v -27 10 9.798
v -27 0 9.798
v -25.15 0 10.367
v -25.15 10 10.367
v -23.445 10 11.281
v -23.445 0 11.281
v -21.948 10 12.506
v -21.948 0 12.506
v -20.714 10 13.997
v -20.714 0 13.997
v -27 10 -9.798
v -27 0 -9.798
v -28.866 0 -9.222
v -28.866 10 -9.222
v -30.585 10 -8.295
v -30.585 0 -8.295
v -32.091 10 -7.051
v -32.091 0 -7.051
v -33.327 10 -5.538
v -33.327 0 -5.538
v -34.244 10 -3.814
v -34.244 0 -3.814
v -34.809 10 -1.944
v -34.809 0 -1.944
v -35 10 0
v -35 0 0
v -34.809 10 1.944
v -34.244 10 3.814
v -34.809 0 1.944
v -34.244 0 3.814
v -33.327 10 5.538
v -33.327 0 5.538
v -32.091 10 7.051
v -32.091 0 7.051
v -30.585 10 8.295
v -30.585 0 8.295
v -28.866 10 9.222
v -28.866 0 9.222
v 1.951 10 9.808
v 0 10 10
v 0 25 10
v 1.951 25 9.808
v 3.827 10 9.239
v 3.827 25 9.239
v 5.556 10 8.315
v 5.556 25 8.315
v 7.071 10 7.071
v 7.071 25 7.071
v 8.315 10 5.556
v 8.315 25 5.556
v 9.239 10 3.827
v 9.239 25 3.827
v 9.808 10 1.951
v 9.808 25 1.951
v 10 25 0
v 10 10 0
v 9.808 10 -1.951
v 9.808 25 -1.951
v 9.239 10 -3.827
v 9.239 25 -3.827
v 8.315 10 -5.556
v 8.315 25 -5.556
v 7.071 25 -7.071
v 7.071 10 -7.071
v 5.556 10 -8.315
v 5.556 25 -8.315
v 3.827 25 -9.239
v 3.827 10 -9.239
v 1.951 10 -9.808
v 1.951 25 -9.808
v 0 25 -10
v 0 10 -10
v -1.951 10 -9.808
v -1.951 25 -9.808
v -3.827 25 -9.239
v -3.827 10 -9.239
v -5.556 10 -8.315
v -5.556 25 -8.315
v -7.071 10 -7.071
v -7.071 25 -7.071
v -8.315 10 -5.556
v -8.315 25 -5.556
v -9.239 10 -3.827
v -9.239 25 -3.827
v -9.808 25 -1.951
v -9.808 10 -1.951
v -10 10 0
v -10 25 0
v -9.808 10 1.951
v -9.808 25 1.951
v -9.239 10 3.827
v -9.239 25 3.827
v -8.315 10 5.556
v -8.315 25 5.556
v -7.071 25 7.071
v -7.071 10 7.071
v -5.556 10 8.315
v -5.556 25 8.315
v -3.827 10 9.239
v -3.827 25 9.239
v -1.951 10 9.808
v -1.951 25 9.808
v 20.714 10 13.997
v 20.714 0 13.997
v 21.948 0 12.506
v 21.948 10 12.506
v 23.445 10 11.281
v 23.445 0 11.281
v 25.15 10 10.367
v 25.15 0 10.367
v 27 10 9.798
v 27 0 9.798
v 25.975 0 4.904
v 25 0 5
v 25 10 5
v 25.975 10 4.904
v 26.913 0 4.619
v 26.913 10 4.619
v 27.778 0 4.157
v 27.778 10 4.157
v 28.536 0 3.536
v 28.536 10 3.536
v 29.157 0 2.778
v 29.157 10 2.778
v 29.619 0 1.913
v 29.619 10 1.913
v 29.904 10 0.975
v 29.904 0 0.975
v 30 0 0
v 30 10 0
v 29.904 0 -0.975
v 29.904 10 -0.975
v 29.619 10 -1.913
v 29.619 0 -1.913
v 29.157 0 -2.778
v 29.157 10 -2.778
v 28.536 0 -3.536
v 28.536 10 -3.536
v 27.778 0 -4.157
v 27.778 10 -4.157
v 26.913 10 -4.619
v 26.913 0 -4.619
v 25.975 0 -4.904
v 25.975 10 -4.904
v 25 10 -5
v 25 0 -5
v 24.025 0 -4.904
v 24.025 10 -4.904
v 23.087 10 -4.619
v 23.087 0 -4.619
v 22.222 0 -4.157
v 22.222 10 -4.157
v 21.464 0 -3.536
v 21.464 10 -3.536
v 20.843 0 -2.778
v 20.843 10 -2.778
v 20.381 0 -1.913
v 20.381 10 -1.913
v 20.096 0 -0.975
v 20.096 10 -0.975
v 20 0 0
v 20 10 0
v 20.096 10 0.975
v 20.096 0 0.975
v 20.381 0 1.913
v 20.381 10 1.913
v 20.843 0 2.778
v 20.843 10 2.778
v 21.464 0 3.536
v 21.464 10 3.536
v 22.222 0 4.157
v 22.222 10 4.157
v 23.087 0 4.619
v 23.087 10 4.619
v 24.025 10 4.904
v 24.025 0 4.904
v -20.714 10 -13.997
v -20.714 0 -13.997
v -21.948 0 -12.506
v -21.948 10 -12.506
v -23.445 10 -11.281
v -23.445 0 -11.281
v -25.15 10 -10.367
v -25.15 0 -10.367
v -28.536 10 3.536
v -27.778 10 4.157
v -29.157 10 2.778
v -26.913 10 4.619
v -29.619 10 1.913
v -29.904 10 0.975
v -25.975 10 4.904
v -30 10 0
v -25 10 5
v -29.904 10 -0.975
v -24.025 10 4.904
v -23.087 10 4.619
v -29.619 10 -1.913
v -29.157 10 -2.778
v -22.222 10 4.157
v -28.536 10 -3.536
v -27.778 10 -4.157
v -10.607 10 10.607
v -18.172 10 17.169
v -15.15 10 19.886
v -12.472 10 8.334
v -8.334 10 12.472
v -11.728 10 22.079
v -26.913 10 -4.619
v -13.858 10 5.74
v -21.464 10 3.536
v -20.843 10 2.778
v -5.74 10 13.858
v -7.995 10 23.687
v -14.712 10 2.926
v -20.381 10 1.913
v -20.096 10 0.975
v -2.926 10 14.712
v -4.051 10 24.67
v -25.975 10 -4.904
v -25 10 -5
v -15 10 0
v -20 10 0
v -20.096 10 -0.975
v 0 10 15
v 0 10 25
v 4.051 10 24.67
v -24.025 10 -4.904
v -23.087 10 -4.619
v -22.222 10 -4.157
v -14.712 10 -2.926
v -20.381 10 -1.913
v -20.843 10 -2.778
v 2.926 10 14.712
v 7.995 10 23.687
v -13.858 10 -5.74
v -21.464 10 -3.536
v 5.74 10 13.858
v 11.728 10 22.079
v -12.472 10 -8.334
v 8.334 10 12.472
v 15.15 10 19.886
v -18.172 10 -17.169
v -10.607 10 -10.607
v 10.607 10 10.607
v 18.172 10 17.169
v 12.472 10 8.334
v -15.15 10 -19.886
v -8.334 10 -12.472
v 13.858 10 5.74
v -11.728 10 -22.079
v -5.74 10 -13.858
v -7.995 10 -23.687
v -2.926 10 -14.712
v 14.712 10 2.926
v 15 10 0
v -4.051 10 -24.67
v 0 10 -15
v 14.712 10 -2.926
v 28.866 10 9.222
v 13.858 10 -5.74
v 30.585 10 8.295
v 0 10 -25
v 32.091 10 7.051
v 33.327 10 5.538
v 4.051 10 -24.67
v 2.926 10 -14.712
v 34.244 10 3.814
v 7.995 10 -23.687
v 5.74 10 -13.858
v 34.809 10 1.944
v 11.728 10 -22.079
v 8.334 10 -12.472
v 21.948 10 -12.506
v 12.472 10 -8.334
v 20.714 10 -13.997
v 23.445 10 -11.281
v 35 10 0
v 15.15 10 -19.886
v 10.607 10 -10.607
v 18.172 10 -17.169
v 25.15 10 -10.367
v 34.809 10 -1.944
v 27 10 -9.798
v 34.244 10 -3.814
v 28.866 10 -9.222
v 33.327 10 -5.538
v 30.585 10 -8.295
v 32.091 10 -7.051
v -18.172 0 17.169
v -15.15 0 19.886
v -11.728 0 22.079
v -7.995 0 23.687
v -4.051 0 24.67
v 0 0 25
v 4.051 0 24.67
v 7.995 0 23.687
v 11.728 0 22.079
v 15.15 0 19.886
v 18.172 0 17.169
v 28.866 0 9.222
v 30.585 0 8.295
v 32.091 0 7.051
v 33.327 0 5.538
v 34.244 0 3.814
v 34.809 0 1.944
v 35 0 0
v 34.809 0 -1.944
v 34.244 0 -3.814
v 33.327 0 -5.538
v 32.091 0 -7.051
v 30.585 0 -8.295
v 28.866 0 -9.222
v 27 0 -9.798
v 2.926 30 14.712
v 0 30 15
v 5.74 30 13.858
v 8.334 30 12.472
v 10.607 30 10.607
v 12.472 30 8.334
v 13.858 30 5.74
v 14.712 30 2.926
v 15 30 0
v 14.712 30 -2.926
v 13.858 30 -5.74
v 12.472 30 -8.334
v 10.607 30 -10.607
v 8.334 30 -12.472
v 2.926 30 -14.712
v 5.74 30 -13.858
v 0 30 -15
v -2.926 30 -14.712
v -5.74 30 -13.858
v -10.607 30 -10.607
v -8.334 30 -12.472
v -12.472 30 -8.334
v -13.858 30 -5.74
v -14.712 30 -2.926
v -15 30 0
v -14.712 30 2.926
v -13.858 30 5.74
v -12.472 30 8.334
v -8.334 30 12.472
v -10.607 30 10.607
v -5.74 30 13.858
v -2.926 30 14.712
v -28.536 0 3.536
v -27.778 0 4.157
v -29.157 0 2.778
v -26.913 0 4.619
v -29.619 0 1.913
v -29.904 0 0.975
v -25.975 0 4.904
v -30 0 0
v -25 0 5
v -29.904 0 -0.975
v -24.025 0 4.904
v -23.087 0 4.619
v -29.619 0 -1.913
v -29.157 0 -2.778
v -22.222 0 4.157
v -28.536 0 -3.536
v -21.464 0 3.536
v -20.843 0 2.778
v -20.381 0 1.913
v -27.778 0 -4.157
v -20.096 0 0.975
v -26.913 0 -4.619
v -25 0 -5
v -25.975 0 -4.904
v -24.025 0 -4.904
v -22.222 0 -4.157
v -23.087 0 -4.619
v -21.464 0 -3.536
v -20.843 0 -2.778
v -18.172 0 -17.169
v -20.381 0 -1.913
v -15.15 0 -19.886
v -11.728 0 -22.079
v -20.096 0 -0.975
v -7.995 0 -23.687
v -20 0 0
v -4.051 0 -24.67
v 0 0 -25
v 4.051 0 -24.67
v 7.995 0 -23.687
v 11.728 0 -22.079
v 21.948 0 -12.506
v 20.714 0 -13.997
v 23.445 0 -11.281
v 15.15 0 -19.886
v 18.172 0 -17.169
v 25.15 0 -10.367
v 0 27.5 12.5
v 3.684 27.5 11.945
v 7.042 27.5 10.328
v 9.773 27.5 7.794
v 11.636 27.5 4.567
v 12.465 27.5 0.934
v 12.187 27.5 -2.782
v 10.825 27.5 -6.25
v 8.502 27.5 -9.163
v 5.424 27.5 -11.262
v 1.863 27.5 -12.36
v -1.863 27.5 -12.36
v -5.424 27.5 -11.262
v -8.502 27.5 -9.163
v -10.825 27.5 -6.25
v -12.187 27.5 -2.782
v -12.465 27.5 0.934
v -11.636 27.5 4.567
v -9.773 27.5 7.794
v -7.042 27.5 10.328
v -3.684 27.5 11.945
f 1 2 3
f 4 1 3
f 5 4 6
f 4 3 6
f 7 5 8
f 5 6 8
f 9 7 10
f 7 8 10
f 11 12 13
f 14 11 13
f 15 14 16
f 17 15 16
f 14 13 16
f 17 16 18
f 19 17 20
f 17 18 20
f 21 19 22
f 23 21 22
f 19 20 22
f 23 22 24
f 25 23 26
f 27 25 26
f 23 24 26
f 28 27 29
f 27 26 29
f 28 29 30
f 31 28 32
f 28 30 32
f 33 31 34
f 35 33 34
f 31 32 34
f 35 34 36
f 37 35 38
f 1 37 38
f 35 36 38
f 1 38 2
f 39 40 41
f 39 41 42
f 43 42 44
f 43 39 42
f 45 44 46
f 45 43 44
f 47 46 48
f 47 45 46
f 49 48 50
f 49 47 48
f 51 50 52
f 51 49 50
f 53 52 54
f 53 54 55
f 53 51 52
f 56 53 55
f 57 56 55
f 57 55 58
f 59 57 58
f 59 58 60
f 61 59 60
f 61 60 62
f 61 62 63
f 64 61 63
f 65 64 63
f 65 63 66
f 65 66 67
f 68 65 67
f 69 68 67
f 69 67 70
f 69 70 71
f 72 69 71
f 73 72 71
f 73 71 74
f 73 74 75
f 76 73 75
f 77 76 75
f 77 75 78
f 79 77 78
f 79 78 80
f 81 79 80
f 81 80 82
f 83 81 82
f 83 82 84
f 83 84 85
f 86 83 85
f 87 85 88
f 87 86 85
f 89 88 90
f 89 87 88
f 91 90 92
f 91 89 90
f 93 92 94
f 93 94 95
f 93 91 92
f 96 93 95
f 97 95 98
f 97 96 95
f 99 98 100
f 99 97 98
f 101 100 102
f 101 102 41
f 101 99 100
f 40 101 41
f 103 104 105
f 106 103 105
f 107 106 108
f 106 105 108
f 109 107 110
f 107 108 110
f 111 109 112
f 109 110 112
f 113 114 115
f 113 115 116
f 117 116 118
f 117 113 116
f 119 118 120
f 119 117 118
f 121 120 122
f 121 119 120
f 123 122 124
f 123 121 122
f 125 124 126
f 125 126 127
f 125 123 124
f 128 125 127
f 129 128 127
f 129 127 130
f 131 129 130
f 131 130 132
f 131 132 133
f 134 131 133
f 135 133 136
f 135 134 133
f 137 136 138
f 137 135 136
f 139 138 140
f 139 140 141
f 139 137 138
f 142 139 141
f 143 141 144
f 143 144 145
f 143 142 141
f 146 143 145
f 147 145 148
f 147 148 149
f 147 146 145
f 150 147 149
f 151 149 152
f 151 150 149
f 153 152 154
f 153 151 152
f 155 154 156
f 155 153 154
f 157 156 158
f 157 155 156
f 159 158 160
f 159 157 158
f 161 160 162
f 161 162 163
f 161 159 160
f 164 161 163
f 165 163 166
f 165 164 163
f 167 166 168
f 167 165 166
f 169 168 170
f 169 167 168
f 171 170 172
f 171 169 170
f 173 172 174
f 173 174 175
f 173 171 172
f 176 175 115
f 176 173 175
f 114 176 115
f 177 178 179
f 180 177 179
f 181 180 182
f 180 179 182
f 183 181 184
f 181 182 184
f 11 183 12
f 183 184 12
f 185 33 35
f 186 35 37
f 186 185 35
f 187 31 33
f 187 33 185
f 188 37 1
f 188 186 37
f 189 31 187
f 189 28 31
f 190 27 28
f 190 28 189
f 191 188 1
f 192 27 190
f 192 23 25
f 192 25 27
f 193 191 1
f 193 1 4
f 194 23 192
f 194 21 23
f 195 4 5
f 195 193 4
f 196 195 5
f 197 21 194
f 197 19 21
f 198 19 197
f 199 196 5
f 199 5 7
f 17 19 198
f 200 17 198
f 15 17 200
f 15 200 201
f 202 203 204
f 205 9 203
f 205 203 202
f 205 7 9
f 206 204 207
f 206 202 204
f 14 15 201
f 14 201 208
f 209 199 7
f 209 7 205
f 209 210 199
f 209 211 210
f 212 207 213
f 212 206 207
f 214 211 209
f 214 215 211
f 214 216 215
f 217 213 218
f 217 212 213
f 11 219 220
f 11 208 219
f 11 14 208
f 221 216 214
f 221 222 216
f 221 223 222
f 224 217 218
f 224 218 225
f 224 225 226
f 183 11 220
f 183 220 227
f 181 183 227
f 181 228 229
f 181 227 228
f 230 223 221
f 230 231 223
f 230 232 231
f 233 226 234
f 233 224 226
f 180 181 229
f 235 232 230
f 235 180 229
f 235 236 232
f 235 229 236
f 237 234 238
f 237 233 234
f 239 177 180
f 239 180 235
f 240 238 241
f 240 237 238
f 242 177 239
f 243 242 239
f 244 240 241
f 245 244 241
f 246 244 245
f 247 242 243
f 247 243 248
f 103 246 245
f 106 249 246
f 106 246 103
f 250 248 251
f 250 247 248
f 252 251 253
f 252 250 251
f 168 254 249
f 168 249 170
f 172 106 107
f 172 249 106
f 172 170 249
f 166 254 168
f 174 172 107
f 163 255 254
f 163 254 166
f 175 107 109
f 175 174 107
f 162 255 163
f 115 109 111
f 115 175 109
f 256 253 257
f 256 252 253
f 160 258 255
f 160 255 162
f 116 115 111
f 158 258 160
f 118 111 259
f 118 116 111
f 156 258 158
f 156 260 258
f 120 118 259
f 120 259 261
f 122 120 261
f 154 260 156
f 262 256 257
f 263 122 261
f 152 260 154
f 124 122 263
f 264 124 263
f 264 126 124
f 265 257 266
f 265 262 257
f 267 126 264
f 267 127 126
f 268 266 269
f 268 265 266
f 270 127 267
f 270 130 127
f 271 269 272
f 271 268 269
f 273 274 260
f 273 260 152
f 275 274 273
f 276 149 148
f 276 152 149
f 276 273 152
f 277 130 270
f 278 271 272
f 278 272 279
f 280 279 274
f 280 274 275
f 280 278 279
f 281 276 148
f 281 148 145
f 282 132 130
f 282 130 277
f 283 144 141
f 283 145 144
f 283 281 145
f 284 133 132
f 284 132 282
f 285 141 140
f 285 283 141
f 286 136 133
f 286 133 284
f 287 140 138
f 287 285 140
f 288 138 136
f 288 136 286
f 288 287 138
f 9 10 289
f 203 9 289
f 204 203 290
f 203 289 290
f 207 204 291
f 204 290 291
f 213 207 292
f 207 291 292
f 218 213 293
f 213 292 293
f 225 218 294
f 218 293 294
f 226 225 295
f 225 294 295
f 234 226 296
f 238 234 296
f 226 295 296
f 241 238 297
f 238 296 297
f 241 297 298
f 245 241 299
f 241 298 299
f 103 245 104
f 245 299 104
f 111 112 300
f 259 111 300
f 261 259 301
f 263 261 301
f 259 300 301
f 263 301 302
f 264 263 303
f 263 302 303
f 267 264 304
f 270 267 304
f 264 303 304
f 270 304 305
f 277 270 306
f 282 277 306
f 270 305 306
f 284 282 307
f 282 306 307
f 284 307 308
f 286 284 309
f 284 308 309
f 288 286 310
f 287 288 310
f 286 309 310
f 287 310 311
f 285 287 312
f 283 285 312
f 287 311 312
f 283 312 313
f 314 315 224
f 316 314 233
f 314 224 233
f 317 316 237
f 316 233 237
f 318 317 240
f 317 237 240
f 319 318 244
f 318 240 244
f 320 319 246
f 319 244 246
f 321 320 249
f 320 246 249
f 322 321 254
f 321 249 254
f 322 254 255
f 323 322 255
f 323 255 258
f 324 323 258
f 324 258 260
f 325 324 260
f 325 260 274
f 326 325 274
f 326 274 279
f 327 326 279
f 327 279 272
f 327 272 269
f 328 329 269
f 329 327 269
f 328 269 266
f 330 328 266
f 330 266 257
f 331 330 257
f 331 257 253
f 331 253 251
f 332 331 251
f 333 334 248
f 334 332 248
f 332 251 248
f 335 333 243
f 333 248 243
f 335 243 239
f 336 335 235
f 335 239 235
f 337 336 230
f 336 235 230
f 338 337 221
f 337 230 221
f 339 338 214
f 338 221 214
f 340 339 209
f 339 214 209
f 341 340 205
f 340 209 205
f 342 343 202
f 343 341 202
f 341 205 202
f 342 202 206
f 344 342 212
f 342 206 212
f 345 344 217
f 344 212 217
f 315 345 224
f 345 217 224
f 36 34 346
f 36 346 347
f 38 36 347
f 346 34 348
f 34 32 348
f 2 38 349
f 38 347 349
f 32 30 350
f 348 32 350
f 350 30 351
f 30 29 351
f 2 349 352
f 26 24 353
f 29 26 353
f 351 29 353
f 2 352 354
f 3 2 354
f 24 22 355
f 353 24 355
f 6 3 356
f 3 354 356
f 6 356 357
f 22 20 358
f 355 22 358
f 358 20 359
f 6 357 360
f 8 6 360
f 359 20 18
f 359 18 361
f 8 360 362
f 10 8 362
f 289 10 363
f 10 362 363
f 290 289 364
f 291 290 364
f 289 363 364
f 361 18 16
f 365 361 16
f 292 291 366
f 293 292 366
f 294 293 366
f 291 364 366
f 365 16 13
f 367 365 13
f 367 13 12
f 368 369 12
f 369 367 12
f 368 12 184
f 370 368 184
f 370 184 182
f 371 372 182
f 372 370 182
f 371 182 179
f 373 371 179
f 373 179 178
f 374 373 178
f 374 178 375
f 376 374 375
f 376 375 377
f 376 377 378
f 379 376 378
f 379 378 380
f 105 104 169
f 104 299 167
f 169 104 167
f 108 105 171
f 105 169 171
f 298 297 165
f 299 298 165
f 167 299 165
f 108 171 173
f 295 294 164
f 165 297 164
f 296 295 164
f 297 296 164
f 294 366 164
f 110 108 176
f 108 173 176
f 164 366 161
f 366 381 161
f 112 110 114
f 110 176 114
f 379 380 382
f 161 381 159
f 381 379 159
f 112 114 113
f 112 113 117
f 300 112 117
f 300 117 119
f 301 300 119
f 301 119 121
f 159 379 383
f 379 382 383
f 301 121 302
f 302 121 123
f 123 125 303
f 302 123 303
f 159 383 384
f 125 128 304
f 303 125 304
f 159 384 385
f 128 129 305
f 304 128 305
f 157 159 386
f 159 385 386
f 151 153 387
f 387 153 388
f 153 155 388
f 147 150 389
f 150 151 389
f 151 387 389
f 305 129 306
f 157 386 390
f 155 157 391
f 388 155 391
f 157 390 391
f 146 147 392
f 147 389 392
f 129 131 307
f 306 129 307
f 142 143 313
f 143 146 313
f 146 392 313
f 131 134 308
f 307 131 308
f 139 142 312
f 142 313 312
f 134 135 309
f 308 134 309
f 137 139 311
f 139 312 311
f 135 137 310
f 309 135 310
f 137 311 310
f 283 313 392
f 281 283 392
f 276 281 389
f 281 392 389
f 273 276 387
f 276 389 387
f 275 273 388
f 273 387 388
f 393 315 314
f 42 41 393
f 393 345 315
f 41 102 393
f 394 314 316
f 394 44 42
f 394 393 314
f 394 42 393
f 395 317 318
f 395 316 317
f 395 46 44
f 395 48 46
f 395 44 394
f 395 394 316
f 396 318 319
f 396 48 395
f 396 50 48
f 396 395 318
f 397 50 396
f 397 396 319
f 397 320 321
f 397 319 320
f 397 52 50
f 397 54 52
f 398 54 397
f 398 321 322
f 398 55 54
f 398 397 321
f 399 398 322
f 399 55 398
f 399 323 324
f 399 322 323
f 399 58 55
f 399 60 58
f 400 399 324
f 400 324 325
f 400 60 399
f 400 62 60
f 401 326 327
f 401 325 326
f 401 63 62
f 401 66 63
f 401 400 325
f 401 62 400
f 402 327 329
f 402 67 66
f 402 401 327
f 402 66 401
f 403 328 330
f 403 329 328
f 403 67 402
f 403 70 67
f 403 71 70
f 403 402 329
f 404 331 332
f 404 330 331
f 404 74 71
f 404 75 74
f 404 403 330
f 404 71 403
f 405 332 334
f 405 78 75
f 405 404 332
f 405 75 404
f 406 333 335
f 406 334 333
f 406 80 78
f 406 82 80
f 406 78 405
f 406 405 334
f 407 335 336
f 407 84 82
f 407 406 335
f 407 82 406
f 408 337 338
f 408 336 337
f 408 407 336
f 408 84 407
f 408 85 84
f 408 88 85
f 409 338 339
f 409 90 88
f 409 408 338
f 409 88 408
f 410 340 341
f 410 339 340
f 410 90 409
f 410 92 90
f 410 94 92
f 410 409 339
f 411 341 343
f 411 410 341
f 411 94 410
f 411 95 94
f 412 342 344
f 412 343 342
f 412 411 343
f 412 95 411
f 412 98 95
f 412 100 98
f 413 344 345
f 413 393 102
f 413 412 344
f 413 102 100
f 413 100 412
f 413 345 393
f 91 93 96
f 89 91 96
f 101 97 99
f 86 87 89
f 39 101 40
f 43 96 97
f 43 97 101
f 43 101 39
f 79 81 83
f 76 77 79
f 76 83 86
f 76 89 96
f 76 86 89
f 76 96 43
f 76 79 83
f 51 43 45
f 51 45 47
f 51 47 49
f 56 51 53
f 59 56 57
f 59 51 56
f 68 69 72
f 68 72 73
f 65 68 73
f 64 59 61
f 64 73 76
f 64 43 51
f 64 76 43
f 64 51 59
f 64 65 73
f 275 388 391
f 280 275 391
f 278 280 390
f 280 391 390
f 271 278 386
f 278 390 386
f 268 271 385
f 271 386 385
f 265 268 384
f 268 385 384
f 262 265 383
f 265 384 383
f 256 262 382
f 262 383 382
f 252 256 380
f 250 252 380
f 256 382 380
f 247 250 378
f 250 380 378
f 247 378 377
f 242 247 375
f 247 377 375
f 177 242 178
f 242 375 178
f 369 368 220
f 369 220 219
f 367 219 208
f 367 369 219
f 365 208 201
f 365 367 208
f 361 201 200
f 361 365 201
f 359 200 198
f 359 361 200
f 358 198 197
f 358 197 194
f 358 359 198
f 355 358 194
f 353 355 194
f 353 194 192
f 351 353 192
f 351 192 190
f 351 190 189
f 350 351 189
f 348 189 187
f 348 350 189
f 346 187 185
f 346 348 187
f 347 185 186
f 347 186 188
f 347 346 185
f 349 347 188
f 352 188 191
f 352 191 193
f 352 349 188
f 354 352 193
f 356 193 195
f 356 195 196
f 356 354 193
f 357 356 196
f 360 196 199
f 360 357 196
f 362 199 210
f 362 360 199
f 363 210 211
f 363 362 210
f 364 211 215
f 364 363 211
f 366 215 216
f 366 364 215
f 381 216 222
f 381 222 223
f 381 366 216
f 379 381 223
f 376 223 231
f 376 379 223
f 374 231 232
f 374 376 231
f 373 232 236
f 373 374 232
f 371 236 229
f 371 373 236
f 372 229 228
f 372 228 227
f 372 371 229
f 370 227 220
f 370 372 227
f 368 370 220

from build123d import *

# Parameters (mm, degrees)
SKETCH1_R           = 5
BOSS_EXTRUDE1_DEPTH = 10
SKETCH2_R           = 15
SKETCH2_R_2         = 10
BOSS_EXTRUDE2_DEPTH = 25
CHAMFER2_SIZE       = 10


with BuildPart() as part:
    # Sketch1 → Boss-Extrude1 (new body)
    with BuildSketch(Plane(origin=(0, 0, 0), x_dir=(1, 0, 0), z_dir=(0, 1, 0))):
        with BuildLine():
            ThreePointArc((-20.714285714, -13.997084244), (0, -25), (20.714285714, -13.997084244))
            ThreePointArc((20.714285714, -13.997084244), (23.445079401, -11.280699536), (27, -9.797958971))
            ThreePointArc((27, -9.797958971), (35, 0), (27, 9.797958971))
            ThreePointArc((27, 9.797958971), (23.445079401, 11.280699536), (20.714285714, 13.997084244))
            ThreePointArc((20.714285714, 13.997084244), (0, 25), (-20.714285714, 13.997084244))
            ThreePointArc((-20.714285714, 13.997084244), (-23.445079401, 11.280699536), (-27, 9.797958971))
            ThreePointArc((-27, 9.797958971), (-35, 0), (-27, -9.797958971))
            ThreePointArc((-27, -9.797958971), (-23.445079401, -11.280699536), (-20.714285714, -13.997084244))
        make_face()
        with Locations(Location((25, 0, 0), (0, 0, 270))):
            Circle(SKETCH1_R, mode=Mode.SUBTRACT)
        with Locations(Location((-25, 0, 0), (0, 0, 90))):
            Circle(SKETCH1_R, mode=Mode.SUBTRACT)
    extrude(amount=BOSS_EXTRUDE1_DEPTH)

    # Sketch2 → Boss-Extrude2 (add)
    with BuildSketch(Plane(origin=(0, 10, 0), x_dir=(1, 0, 0), z_dir=(0, 1, 0))):
        with Locations(Location((0, 0, 0), (0, 0, 270))):
            Circle(SKETCH2_R)
        with Locations(Location((0, 0, 0), (0, 0, 270))):
            Circle(SKETCH2_R_2, mode=Mode.SUBTRACT)
    extrude(amount=BOSS_EXTRUDE2_DEPTH)

    # Chamfer2
    # the kernel refuses this chamfer: 10 mm, written as the material it takes off along each edge
    with BuildSketch(Plane(origin=(0, 35, 0), x_dir=(0, 0, 1), z_dir=(-1, 0, 0))) as chamfer2_piece_1:
        Polygon((10 + CHAMFER2_SIZE, 0), (10, -CHAMFER2_SIZE), (10, 0), align=None)
    revolve(axis=Axis((0, 35, 0), (0, 1, 0)), mode=Mode.SUBTRACT)


solid = part.part
